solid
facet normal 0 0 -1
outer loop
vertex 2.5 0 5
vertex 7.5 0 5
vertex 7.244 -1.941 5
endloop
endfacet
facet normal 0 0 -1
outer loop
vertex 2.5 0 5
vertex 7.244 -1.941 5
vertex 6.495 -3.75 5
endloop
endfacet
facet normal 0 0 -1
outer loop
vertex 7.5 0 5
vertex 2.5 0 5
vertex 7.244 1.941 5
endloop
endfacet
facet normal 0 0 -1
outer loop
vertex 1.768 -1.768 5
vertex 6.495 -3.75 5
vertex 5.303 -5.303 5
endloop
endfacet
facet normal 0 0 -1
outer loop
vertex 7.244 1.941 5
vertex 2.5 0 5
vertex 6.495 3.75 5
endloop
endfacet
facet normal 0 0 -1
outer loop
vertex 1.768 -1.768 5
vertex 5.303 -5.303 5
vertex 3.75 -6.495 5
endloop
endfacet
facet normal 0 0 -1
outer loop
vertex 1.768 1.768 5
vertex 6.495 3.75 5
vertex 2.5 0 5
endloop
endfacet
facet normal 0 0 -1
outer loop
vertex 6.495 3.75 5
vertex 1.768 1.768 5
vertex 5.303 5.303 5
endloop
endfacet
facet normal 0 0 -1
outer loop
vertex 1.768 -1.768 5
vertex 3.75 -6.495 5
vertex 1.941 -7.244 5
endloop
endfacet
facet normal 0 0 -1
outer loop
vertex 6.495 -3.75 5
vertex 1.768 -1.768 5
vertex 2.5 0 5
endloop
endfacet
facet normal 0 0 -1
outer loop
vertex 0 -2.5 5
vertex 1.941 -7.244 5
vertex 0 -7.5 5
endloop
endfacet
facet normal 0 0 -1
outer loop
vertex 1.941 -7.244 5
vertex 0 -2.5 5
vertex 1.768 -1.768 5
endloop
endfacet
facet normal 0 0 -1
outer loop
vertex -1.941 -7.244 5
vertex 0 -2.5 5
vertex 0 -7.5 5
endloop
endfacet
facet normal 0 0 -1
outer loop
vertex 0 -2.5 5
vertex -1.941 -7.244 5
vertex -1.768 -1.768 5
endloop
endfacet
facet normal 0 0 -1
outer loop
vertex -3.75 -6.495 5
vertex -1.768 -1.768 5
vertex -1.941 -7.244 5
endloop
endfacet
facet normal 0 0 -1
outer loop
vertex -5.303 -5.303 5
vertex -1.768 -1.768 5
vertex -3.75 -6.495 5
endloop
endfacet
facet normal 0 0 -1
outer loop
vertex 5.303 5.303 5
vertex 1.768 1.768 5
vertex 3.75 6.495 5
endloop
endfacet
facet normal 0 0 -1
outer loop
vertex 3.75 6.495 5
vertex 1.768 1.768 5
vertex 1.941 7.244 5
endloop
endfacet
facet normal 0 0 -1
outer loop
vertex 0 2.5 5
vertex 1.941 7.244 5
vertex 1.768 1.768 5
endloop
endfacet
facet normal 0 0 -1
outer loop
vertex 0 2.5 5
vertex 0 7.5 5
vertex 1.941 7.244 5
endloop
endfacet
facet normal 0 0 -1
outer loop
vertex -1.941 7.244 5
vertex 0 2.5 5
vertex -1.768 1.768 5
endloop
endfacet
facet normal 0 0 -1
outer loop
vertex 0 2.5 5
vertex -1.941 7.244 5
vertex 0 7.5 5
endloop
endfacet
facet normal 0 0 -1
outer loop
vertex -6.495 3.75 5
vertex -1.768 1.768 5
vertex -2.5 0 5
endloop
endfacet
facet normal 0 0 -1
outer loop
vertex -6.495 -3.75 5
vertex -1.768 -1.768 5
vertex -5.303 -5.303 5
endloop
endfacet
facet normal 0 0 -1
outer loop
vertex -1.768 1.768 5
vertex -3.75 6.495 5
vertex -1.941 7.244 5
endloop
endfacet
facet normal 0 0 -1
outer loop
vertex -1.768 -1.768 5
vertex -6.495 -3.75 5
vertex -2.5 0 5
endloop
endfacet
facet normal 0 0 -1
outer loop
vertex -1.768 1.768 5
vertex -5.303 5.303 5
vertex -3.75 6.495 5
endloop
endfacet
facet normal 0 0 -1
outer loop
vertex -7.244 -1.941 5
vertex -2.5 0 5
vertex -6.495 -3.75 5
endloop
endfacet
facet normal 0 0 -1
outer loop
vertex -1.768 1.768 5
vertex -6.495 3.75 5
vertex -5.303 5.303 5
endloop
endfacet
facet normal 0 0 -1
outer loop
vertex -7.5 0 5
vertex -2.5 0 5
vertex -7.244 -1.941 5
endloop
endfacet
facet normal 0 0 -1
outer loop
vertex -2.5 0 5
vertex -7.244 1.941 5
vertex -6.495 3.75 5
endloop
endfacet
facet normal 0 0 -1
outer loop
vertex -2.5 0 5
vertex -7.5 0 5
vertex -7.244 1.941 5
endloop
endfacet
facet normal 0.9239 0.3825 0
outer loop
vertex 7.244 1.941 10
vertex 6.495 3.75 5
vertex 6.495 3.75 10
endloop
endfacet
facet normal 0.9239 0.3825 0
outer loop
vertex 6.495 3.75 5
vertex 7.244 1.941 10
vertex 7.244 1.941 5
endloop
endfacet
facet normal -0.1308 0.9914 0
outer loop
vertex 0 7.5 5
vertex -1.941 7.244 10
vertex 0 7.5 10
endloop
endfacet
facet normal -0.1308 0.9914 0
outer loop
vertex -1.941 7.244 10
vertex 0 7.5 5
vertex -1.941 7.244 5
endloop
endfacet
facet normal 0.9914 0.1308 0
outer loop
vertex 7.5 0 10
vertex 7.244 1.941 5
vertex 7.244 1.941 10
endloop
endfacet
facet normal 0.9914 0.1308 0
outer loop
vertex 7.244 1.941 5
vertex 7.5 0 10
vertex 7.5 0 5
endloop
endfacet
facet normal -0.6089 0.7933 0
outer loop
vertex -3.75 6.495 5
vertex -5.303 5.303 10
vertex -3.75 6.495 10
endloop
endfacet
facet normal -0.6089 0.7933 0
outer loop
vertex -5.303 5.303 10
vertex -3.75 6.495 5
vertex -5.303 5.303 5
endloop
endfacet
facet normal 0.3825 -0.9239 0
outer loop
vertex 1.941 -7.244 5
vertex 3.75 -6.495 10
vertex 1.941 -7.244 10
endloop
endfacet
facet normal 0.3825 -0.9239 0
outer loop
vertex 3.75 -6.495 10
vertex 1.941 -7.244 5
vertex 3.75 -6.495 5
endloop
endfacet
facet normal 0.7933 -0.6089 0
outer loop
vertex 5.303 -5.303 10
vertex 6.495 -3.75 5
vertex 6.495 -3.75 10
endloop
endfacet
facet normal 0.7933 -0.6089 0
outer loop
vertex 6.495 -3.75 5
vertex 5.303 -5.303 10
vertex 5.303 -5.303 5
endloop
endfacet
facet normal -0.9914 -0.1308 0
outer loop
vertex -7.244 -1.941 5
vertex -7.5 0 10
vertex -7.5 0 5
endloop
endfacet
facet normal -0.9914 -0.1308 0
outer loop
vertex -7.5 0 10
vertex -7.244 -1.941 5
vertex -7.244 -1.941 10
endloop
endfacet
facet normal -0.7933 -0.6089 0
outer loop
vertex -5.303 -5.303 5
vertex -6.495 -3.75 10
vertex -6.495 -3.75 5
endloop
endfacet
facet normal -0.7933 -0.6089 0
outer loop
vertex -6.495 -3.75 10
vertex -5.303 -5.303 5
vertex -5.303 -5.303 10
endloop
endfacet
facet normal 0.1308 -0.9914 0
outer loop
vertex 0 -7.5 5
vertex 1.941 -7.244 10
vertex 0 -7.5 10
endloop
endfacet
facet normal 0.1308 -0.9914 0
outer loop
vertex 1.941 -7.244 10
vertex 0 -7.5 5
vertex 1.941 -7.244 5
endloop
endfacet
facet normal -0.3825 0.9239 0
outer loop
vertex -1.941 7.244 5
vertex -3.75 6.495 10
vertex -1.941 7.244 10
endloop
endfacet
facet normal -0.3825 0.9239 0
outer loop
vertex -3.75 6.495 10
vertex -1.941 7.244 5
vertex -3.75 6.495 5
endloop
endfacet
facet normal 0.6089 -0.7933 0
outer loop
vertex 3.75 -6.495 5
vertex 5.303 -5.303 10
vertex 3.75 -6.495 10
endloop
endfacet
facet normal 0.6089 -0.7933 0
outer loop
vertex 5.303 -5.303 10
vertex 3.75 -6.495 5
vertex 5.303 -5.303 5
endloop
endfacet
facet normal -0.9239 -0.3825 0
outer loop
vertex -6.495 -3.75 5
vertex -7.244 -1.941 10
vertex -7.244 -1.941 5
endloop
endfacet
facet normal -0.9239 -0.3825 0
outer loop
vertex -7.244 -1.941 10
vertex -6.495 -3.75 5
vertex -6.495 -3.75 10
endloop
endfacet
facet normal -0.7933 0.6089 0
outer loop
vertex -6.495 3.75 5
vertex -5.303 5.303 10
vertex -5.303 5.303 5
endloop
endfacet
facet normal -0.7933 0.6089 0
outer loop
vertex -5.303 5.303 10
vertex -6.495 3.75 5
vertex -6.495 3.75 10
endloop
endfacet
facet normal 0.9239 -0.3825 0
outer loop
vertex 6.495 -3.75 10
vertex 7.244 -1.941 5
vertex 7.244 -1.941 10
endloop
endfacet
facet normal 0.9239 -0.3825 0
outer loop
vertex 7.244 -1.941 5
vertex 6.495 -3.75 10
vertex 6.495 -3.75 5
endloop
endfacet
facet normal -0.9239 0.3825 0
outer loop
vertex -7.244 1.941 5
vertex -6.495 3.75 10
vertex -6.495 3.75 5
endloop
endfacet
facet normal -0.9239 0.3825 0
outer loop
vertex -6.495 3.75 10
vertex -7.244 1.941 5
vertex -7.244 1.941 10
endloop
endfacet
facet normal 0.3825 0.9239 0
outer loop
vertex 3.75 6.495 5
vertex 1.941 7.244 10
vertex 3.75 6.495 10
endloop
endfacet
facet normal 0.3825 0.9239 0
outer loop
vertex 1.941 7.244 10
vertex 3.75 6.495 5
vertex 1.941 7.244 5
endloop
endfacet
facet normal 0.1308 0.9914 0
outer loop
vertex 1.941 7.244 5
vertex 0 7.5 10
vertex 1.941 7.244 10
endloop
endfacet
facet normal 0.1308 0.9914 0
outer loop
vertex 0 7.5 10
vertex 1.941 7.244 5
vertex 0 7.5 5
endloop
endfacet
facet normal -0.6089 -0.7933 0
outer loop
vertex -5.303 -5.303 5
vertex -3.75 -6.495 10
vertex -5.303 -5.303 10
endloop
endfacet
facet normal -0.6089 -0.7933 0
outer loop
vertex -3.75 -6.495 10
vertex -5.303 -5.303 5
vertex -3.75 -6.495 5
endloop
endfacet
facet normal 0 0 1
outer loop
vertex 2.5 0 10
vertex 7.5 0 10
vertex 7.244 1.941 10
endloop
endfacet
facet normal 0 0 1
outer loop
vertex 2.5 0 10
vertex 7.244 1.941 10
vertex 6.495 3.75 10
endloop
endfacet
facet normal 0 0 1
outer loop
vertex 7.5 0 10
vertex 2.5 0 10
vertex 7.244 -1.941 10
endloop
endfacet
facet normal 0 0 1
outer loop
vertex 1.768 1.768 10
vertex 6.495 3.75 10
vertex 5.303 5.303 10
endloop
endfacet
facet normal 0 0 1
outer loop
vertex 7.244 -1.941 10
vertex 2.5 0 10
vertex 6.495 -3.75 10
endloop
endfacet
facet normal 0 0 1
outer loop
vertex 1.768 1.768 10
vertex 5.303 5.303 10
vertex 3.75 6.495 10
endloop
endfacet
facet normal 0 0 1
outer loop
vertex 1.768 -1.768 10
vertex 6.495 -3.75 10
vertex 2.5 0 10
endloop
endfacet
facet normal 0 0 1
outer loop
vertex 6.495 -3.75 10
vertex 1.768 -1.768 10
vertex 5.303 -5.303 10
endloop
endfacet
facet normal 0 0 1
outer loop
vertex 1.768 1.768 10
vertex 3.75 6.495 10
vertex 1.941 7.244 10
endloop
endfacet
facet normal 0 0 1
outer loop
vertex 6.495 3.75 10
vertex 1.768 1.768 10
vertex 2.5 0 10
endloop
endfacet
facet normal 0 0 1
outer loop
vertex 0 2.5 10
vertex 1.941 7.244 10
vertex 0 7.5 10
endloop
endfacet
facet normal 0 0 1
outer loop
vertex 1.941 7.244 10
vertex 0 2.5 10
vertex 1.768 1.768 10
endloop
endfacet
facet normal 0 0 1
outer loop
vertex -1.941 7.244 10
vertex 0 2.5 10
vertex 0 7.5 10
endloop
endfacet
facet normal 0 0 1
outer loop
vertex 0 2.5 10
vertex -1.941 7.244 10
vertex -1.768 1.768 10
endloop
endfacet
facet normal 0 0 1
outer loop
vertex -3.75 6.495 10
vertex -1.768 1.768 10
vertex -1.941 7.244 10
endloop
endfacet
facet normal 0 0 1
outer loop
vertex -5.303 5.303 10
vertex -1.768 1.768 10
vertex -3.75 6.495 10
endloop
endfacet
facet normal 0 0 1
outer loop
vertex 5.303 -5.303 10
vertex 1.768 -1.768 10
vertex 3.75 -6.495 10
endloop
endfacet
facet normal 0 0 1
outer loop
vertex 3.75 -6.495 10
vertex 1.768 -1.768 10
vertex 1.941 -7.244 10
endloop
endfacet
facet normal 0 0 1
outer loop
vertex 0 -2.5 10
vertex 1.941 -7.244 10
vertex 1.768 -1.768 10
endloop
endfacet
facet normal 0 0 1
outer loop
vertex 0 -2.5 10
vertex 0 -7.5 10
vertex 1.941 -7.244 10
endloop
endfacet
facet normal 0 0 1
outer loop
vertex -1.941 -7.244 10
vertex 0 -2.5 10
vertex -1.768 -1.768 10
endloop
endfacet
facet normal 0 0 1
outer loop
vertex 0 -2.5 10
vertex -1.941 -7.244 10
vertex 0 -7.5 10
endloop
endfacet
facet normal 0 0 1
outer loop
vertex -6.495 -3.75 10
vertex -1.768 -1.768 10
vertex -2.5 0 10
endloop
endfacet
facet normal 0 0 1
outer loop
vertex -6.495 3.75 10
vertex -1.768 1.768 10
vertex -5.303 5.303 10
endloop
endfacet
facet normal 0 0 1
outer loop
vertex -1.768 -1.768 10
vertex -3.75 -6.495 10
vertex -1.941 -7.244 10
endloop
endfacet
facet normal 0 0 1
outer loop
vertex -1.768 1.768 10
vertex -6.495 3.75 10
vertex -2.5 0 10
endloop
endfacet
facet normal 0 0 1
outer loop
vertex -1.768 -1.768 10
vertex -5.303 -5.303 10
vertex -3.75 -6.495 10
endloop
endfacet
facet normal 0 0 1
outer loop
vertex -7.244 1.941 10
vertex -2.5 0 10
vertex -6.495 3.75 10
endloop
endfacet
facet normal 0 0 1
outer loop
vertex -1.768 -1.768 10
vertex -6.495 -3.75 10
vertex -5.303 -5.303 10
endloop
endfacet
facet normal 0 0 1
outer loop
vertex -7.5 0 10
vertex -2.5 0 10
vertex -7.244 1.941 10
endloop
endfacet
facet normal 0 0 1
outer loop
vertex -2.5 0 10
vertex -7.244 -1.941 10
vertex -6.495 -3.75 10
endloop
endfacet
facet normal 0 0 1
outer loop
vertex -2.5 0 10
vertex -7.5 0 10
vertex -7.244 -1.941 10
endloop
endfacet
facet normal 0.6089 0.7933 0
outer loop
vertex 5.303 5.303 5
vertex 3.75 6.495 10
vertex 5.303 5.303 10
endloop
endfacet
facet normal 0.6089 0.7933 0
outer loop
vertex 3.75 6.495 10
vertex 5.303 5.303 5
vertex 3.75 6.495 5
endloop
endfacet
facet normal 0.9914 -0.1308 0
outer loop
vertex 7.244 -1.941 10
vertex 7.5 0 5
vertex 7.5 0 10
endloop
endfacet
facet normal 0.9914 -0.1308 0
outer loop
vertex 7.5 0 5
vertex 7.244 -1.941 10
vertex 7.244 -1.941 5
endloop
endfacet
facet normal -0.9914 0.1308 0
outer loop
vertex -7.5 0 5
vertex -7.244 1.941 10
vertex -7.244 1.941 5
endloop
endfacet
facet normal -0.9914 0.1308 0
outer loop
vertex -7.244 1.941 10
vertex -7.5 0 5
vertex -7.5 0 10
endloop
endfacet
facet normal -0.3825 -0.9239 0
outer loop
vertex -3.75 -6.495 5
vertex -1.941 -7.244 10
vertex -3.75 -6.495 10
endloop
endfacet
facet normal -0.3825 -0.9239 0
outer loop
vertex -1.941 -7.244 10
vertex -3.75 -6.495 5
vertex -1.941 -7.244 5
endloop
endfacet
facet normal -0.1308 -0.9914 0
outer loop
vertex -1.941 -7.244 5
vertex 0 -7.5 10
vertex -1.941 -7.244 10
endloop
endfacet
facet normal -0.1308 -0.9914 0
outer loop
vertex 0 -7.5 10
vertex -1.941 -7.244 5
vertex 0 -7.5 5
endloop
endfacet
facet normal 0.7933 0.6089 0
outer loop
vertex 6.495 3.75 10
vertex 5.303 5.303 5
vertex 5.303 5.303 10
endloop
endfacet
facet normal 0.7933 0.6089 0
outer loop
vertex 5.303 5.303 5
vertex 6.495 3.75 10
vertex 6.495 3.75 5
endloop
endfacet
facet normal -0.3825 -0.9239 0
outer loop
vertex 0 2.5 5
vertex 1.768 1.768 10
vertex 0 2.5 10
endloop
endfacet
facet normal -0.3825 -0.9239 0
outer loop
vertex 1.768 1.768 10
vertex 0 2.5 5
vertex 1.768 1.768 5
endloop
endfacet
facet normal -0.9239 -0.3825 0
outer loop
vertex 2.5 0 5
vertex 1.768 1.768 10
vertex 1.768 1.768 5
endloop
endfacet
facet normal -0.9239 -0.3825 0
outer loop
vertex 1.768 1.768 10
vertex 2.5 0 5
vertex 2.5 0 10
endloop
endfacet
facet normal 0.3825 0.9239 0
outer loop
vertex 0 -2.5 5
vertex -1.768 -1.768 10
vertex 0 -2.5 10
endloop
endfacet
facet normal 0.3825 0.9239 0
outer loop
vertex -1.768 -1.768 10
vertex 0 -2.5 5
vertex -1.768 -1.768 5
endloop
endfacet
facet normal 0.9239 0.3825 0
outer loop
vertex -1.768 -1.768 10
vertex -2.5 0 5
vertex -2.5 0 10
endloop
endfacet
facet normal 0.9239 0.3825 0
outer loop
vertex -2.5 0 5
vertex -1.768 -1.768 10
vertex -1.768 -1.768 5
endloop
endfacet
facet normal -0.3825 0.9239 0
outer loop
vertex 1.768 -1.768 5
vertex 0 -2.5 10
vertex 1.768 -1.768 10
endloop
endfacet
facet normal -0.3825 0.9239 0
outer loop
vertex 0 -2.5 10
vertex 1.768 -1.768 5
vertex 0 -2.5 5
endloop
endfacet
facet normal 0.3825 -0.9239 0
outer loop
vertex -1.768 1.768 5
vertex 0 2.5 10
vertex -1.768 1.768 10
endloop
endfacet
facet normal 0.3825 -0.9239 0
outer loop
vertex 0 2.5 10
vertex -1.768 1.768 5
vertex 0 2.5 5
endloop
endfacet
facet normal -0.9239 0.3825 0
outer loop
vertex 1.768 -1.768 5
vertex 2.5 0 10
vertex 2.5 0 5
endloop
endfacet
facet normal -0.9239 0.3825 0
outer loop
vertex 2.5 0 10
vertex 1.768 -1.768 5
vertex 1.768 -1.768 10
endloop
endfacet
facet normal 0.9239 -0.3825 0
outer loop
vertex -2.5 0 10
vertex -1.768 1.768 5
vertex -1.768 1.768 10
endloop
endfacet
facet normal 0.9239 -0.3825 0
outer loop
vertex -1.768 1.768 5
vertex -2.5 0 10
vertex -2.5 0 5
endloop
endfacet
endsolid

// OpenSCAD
// expect: MCAD library is not in the app
use <MCAD/involute_gears.scad>
gear(number_of_teeth = 20);
